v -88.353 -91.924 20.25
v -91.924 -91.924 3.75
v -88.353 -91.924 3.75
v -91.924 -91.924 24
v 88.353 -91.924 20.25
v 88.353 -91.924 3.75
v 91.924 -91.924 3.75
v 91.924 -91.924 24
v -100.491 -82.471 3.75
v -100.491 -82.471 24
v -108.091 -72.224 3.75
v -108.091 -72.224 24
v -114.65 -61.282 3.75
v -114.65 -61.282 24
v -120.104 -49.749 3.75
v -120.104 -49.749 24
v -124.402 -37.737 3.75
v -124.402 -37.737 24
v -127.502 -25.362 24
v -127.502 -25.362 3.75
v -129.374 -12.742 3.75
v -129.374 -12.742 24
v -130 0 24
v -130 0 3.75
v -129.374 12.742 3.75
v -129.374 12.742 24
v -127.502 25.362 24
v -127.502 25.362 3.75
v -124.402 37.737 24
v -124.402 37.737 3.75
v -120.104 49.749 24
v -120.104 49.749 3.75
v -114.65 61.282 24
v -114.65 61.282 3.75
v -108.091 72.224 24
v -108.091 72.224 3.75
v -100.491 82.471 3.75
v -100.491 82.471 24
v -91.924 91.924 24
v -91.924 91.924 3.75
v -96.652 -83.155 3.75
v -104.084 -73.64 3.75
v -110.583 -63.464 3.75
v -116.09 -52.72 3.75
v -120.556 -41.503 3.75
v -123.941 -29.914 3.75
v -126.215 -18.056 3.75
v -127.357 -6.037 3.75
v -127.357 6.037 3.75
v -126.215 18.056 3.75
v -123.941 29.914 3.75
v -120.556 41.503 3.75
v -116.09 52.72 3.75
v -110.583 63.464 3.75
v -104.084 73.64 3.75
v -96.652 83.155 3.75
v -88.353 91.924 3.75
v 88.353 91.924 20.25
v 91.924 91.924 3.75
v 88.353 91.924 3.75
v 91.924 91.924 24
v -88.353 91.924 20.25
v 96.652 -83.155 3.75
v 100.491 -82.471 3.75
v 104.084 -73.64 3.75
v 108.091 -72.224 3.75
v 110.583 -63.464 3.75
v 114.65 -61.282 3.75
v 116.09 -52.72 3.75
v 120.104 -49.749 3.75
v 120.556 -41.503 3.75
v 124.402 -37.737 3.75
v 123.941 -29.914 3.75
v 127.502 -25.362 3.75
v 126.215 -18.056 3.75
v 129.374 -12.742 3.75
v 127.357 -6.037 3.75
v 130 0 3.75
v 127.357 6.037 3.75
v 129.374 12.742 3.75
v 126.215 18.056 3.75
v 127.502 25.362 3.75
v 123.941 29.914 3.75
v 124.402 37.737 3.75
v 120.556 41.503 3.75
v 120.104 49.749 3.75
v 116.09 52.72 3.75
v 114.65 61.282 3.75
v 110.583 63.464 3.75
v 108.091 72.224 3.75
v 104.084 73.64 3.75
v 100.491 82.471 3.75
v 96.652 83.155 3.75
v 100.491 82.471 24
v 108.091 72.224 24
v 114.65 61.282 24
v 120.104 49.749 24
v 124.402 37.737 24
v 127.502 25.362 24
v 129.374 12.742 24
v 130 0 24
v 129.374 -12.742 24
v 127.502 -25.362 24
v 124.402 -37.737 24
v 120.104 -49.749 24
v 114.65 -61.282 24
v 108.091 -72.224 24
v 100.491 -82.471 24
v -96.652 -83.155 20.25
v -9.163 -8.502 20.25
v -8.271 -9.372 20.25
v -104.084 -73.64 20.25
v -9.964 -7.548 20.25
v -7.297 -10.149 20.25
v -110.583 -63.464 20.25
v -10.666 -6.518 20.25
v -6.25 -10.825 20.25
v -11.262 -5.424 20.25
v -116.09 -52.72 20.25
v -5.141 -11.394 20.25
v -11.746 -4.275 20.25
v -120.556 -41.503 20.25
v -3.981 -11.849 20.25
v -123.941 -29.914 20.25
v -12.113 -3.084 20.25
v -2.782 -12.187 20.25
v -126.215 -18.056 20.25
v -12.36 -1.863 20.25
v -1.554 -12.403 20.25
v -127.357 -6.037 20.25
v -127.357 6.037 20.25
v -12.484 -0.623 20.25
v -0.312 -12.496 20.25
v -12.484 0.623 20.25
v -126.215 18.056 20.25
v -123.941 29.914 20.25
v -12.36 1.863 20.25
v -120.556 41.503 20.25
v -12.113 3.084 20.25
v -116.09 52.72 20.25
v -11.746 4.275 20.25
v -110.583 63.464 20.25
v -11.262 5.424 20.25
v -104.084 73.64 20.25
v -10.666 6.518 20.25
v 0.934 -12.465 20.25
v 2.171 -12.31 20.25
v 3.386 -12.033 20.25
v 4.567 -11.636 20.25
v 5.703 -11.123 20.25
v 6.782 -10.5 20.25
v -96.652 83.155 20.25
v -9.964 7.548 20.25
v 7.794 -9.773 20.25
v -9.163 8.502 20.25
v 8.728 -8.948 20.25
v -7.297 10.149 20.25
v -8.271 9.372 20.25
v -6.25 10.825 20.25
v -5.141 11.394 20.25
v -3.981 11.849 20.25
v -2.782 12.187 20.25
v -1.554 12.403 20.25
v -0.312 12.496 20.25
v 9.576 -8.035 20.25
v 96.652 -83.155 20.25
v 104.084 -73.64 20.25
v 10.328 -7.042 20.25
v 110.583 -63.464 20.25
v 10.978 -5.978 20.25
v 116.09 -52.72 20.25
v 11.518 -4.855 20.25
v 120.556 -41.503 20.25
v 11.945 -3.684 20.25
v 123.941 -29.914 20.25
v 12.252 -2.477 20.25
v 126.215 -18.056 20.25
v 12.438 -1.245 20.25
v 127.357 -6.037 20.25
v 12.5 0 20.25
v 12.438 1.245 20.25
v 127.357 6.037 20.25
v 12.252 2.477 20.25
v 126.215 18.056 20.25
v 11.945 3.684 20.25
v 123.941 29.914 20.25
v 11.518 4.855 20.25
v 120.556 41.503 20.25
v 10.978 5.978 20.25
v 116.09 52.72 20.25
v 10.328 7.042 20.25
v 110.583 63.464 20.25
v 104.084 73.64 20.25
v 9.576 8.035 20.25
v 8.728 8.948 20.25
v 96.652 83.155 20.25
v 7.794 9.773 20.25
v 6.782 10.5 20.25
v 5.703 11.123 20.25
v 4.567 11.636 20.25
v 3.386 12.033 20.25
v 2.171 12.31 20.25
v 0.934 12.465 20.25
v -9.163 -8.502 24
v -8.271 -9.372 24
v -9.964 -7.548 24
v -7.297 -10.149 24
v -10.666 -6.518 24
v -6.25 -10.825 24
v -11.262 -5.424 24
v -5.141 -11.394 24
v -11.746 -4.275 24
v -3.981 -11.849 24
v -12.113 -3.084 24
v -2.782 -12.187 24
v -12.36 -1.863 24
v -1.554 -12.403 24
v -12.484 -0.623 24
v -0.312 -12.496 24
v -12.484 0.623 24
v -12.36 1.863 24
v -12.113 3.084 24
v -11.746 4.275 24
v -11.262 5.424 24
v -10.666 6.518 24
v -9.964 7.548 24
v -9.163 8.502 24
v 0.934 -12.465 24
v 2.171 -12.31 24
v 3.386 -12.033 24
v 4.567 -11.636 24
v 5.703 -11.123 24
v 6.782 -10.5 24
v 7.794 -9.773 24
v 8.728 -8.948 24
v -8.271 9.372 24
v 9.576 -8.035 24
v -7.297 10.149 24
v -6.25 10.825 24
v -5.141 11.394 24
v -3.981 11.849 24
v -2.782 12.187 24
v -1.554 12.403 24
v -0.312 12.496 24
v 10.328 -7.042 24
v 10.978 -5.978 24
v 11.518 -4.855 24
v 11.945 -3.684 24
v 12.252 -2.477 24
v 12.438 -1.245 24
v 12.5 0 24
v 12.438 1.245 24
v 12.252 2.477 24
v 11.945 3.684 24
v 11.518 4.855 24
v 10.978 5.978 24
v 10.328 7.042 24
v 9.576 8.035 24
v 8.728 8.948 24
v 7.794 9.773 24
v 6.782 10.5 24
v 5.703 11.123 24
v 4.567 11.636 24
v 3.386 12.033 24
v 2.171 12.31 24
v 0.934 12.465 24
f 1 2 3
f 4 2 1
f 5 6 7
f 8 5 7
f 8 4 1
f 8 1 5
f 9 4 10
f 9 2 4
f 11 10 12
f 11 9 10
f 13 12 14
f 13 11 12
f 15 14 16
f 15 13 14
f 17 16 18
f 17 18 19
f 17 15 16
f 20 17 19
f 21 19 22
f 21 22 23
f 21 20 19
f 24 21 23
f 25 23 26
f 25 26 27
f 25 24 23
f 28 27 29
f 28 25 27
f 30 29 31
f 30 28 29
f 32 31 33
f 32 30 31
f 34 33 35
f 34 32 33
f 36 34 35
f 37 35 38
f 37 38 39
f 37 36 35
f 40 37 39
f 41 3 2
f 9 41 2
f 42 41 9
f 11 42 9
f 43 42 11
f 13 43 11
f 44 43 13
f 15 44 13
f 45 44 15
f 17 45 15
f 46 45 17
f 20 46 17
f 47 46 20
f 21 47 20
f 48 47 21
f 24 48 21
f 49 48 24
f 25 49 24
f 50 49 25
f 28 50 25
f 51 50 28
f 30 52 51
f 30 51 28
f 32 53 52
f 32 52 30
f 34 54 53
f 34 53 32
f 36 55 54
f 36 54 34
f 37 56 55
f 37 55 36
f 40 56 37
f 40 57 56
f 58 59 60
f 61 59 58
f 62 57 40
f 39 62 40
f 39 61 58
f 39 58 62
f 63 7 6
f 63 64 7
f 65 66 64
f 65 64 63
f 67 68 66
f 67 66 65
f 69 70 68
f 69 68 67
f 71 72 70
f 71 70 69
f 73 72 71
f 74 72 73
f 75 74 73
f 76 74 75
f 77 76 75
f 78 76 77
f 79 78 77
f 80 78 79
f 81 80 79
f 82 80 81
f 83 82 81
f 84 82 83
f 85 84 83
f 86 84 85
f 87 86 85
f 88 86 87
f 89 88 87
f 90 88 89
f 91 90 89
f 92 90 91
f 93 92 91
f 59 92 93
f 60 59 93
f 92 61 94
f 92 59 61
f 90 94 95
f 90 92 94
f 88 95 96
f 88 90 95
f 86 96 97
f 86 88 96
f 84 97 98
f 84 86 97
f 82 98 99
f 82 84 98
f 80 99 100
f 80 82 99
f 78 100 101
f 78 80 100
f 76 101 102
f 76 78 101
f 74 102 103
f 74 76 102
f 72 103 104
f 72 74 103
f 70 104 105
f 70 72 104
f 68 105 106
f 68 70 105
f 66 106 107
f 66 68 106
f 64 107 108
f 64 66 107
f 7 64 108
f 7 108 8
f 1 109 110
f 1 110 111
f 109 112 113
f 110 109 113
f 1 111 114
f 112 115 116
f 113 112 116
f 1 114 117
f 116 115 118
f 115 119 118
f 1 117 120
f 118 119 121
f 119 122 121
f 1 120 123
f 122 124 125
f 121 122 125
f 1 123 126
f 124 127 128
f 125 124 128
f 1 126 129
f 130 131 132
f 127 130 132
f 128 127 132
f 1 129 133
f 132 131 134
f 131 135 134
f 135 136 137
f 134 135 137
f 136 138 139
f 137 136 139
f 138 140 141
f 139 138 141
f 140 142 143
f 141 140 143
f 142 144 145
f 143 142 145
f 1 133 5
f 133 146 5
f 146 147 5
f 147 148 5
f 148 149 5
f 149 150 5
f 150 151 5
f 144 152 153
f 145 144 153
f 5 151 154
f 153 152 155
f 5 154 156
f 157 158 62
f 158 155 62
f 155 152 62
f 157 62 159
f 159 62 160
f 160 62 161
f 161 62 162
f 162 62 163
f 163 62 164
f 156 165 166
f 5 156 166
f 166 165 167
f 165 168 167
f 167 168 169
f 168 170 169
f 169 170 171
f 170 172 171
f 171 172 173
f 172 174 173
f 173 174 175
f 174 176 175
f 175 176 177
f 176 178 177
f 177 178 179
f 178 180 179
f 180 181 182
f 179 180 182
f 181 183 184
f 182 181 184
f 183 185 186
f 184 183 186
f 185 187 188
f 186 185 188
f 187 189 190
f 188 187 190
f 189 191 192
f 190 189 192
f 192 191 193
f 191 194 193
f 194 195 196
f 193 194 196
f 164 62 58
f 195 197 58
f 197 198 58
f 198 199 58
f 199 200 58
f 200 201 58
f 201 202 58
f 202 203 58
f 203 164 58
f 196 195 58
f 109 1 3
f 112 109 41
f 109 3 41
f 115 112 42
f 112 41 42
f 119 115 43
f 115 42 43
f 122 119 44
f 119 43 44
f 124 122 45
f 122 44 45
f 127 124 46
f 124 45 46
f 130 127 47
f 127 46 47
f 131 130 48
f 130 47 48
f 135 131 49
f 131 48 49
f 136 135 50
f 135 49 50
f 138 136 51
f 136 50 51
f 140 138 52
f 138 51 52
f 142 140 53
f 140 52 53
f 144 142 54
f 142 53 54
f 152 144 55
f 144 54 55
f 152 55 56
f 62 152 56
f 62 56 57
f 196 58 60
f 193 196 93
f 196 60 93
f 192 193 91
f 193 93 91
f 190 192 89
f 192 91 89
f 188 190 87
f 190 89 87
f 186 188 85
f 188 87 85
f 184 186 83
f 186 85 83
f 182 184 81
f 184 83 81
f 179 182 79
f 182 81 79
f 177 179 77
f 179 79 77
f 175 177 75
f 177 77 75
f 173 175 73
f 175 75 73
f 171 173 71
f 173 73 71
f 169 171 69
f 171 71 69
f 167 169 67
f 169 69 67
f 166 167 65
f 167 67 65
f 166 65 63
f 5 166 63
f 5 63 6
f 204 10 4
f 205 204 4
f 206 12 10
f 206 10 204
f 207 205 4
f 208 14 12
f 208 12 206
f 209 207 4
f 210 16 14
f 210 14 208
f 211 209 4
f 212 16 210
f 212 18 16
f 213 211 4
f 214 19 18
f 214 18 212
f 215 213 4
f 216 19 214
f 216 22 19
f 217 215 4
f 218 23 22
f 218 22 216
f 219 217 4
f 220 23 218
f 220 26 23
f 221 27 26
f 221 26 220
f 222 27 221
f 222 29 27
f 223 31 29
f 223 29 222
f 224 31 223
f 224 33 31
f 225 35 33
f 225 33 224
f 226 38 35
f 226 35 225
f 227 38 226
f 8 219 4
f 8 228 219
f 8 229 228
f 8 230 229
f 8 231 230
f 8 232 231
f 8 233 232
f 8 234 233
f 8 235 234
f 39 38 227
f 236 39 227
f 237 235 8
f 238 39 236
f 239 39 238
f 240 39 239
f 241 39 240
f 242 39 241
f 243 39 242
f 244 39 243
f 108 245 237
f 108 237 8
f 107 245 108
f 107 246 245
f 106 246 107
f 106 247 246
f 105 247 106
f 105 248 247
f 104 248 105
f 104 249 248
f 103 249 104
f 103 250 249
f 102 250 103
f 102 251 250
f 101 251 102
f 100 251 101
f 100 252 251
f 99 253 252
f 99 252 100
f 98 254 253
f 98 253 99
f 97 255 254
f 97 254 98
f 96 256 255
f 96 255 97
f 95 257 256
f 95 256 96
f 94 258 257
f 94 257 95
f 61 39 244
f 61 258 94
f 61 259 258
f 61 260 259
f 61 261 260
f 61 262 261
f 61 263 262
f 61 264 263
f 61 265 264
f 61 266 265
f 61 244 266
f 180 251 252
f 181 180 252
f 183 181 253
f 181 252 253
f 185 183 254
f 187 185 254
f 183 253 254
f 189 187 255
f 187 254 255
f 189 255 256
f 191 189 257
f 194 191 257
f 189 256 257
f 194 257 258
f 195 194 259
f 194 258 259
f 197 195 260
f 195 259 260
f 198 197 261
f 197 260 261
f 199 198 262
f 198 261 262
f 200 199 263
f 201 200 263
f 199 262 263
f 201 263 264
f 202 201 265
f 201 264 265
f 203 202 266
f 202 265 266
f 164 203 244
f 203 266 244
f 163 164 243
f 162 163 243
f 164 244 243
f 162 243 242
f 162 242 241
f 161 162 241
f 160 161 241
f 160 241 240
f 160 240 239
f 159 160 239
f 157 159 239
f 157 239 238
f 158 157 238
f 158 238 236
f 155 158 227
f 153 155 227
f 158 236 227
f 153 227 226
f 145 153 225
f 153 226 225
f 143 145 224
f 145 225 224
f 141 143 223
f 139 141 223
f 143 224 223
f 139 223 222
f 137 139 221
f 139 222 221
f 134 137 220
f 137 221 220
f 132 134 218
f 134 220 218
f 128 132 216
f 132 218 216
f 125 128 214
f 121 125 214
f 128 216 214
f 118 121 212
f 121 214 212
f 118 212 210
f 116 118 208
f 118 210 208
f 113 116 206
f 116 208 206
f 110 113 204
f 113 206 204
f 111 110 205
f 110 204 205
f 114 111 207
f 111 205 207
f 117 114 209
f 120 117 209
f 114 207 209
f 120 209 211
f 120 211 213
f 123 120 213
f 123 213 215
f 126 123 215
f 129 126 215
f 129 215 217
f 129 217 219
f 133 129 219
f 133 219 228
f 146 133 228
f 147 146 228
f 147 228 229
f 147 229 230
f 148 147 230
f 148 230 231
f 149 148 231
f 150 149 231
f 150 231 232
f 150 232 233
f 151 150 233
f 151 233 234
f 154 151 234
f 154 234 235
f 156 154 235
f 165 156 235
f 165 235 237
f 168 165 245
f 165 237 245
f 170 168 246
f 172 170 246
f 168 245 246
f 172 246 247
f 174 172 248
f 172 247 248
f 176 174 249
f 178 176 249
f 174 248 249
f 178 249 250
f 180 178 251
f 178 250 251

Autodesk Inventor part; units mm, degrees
ref_plane "YZ Plane" through (0, 0, 0) normal (1, 0, 0) x (0, 1, 0)
ref_plane "XZ Plane" through (0, 0, 0) normal (0, 1, 0) x (-1, 0, 0)
sketch "Sketch1" plane through (0, 0, 0) normal (0, 0, 1) x (1, 0, 0)
  circle A0 centre (0, 0) radius 130
  dimension "d0" = 260
extrude "Extrusion1" add sketch "Sketch1" along normal blind 24
ref_plane "Work Plane1" through (0, 0, 12) normal (0, 0, 1) x (1, 0, 0)
sketch "Sketch3" plane through (0, 0, 12) normal (0, 0, 1) x (1, 0, 0)
  circle A0 centre (0, 0) radius 127.5
  dimension "d4" = 255
extrude "Extrusion2" cut sketch "Sketch3" along normal mid plane 16.5
sketch "Sketch4" plane through (0, 0, 24) normal (0, 0, 1) x (1, 0, 0)
  circle A0 centre (0, 0) radius 12.5
  dimension "d7" = 25
extrude "Extrusion3" cut sketch "Sketch4" against normal blind 5
sketch "Sketch5" plane through (0, 0, 24) normal (0, 0, 1) x (1, 0, 0)
  line L0 (0, 0) -> (91.9239, 91.9239)
  circle A0 centre (0, 0) radius 130 projected
  line L1 (0, 0) -> (130, 0) construction
  line L2 (91.9239, 91.9239) -> (-91.9239, 91.9239)
  arc A1 (91.9239, 91.9239) -> (-91.9239, 91.9239) centre (0, 0) ccw
  dimension "d10" = 45
extrude "Extrusion4" cut sketch "Sketch5" against normal through all contours L2 A0 picked at (-17.7846, 107.7382)
mirror "Mirror1" about plane through (0, 0, 0) normal (0, 1, 0) of "Extrusion4"
sketch "Sketch8" plane through (0, 0, 0) normal (0, 0, -1) x (-1, 0, 0)
  line L0 (91.9239, 91.9239) -> (-91.9239, 91.9239) projected
  line L1 (-91.9239, 91.9239) -> (91.9239, 91.9239)
  arc A0 (91.9239, -91.9239) -> (91.9239, 91.9239) centre (0, 0) ccw projected
  arc A1 (91.9239, -91.9239) -> (91.9239, 91.9239) centre (91.9239, 0) ccw
  line L2 (91.9239, -91.9239) -> (-91.9239, -91.9239)
  arc A2 (-91.9239, 91.9239) -> (-91.9239, -91.9239) centre (0, 0) ccw projected
  arc A3 (-91.9239, 91.9239) -> (-91.9239, -91.9239) centre (-91.9239, 0) ccw
  dimension "d15" = 183.8478
  dimension "d16" = 183.8478
extrude "Extrusion5" cut sketch "Sketch8" against normal blind 3.75
sketch "Sketch9" plane through (-91.9239, 91.9239, 24) normal (0, 1, 0) x (1, 0, 0)
  point P0 (91.9239, 24)
properties part number "Gear Container"
